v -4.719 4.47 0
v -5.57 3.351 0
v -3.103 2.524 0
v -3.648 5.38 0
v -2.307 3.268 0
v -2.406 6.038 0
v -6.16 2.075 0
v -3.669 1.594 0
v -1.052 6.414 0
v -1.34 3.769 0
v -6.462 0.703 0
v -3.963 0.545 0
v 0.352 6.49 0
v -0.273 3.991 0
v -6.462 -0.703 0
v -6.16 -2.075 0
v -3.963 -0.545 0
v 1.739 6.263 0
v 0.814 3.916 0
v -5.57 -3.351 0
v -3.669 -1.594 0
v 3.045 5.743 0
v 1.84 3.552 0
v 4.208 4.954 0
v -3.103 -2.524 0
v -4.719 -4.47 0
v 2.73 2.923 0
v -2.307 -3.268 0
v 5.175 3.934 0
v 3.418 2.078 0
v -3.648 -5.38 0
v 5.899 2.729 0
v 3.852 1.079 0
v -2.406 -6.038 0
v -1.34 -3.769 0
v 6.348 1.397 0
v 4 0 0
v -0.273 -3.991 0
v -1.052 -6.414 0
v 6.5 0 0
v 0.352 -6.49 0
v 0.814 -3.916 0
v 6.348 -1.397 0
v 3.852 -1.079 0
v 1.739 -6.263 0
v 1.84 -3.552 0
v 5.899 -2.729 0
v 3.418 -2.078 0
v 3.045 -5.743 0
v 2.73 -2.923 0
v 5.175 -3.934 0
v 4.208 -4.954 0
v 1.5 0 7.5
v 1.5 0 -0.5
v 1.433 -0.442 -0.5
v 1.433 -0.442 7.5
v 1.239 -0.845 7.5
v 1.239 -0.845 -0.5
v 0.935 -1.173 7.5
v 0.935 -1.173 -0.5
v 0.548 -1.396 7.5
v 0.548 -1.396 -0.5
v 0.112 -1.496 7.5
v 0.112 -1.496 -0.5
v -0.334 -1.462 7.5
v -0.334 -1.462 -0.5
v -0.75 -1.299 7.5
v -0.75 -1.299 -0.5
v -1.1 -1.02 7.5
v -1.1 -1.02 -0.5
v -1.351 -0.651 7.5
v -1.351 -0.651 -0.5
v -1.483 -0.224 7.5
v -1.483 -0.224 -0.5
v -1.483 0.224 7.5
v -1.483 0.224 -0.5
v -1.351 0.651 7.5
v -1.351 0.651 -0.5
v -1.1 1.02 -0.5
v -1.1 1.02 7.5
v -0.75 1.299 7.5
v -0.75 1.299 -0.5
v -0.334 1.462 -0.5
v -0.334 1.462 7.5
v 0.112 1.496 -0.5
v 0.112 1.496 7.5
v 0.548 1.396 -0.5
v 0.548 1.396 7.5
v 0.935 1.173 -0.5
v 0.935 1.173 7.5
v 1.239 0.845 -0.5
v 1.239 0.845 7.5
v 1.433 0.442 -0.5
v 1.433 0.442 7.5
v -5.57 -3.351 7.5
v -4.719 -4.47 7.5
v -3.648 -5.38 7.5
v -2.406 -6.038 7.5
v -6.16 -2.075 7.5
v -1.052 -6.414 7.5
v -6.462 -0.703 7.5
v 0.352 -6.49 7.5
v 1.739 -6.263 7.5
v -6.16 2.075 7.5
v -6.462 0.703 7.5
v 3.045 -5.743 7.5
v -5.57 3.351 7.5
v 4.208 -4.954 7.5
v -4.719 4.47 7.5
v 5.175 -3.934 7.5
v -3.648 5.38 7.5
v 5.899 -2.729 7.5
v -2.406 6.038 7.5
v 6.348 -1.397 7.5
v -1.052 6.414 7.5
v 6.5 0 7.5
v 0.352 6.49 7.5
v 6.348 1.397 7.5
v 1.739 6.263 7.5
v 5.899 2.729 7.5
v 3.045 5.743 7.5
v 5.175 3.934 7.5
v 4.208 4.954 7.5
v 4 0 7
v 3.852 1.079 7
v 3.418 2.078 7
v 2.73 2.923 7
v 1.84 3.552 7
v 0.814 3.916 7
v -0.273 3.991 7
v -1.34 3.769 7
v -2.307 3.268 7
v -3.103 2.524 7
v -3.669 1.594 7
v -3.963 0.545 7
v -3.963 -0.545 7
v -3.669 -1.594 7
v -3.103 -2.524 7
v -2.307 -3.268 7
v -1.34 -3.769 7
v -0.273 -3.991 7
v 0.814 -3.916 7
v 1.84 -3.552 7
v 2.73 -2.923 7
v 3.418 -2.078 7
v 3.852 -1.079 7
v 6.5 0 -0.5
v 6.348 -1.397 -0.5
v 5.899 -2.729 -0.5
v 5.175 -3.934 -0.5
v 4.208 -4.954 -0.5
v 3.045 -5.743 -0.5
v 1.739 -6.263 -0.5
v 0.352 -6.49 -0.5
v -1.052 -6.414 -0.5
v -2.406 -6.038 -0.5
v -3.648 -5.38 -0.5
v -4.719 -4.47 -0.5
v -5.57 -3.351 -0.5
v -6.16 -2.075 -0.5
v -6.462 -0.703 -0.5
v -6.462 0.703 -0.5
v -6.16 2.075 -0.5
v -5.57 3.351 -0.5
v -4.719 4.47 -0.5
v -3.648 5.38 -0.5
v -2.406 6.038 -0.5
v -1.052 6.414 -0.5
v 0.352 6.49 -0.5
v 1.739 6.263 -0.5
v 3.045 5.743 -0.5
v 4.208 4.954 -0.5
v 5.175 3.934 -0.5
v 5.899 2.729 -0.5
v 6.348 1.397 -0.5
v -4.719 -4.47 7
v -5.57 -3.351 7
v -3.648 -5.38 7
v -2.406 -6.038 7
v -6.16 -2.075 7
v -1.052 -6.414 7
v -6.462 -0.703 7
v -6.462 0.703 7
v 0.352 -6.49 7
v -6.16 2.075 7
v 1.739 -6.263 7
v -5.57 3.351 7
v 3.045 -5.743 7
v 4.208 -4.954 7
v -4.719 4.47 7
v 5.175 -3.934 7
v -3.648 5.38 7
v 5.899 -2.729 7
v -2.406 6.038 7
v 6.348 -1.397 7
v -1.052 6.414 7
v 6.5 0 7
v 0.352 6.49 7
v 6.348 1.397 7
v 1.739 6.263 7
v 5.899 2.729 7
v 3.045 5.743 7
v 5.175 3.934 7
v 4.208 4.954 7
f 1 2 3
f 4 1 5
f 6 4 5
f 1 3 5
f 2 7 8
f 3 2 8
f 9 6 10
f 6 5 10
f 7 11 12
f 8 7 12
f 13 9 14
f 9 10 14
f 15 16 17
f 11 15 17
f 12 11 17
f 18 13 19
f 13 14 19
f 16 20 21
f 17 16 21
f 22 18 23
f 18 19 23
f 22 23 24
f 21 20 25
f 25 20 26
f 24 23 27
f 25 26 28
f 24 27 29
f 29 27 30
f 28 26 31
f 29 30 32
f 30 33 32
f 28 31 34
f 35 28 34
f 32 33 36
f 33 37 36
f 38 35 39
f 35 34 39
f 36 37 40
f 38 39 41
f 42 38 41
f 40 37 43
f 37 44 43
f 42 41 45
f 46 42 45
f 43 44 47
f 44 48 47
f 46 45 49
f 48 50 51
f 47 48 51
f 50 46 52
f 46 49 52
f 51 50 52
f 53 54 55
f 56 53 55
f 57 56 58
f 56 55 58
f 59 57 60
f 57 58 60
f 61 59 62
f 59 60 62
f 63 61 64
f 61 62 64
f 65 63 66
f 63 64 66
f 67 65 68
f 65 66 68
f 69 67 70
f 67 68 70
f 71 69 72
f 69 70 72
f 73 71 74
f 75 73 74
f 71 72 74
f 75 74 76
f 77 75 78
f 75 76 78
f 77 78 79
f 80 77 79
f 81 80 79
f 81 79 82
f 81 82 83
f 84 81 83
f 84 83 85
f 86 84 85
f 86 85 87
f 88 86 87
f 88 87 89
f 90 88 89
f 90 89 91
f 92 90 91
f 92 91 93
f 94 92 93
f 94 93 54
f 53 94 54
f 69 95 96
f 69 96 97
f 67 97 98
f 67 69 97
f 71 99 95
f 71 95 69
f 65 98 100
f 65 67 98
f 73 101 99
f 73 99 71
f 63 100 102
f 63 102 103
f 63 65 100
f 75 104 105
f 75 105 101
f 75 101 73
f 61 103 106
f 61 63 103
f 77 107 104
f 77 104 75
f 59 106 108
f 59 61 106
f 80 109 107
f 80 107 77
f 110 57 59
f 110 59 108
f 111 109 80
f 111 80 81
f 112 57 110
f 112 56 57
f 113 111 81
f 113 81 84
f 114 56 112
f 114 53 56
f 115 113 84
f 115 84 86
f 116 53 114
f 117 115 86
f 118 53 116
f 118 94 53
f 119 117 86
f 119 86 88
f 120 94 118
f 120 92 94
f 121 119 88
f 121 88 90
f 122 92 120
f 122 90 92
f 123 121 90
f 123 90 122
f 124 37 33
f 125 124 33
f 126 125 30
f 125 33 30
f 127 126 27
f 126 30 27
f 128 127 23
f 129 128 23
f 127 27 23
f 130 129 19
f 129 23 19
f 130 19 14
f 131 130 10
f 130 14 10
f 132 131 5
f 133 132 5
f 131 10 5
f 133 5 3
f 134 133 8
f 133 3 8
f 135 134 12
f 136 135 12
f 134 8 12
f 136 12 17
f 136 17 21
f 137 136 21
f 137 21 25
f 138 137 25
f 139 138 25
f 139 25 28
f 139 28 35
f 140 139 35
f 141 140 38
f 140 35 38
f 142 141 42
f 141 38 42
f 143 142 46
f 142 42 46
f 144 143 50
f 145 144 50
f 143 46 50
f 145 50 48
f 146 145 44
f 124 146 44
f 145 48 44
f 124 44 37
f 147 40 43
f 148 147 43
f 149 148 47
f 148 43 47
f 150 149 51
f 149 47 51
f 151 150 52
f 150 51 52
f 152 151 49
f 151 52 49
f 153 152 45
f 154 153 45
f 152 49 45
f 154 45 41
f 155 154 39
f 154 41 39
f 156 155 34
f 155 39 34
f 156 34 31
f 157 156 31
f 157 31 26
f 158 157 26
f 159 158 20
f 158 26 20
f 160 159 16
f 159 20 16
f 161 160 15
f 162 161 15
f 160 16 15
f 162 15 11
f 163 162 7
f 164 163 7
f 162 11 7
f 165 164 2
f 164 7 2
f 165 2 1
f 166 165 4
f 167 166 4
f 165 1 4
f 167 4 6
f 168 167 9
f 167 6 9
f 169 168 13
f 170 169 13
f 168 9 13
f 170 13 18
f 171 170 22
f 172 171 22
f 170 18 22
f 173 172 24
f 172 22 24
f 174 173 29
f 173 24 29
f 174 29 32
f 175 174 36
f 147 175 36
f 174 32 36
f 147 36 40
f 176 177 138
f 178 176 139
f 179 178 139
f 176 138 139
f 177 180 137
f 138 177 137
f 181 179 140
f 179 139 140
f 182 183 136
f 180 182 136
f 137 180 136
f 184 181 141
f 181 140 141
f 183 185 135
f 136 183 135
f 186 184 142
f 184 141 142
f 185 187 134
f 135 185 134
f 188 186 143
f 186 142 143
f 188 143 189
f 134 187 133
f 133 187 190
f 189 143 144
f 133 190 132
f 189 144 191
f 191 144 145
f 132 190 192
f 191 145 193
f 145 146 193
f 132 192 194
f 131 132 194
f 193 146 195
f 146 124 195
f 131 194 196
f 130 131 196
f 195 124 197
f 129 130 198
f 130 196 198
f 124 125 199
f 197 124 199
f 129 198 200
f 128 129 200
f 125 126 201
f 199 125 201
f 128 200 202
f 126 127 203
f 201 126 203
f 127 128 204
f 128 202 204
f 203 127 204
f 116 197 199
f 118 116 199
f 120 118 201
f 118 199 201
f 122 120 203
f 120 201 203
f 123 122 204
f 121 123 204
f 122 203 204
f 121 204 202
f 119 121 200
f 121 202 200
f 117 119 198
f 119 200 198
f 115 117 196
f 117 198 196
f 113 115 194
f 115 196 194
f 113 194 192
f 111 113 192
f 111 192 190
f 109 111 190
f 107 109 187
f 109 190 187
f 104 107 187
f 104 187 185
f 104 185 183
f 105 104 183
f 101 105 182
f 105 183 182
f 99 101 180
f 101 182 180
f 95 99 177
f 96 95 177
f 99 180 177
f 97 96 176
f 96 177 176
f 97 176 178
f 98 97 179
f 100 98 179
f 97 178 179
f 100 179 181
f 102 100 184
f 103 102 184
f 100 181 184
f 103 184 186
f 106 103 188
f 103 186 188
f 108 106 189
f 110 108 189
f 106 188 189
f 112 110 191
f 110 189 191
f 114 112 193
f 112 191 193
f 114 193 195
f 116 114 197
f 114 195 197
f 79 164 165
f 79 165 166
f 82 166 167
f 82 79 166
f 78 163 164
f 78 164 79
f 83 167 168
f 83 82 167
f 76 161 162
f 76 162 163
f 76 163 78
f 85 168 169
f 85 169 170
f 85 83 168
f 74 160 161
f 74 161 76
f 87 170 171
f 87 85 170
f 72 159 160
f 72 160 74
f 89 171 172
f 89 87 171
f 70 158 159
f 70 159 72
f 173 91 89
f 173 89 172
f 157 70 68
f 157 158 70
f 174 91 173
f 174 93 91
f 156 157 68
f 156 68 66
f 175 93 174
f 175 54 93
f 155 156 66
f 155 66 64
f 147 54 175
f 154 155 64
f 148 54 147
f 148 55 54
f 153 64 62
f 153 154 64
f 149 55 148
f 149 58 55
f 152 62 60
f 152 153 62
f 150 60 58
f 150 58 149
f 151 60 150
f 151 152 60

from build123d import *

# Parameters (mm, degrees)
SKETCH067_R     = 4
PAD037_DEPTH    = 7
SKETCH068_R     = 6.5
PAD038_DEPTH    = 0.5
SKETCH070_R     = 6.5
PAD039_DEPTH    = 0.5
SKETCH071_R     = 1.5
POCKET037_DEPTH = 8.001


with BuildPart() as part:
    # Sketch067 → Pad037 (new body)
    with BuildSketch(Plane.XY):
        Circle(SKETCH067_R)
    extrude(amount=PAD037_DEPTH)

    # Sketch068 (on Face3 of Pad037) → Pad038 (join)
    with BuildSketch(Plane.XY.offset(7)):
        Circle(SKETCH068_R)
    extrude(amount=PAD038_DEPTH)

    # Sketch070 (on Face5 of Pad038) → Pad039 (join)
    with BuildSketch(Plane(origin=(0, 0, 0), x_dir=(1, 0, 0), z_dir=(0, 0, -1))):
        Circle(SKETCH070_R)
    extrude(amount=PAD039_DEPTH)

    # Sketch071 (on Face3 of Pad039) → Pocket037 (cut, through all)
    with BuildSketch(Plane(origin=(0, 0, -0.5), x_dir=(1, 0, 0), z_dir=(0, 0, -1))):
        Circle(SKETCH071_R)
    extrude(amount=-POCKET037_DEPTH, mode=Mode.SUBTRACT)


solid = part.part
